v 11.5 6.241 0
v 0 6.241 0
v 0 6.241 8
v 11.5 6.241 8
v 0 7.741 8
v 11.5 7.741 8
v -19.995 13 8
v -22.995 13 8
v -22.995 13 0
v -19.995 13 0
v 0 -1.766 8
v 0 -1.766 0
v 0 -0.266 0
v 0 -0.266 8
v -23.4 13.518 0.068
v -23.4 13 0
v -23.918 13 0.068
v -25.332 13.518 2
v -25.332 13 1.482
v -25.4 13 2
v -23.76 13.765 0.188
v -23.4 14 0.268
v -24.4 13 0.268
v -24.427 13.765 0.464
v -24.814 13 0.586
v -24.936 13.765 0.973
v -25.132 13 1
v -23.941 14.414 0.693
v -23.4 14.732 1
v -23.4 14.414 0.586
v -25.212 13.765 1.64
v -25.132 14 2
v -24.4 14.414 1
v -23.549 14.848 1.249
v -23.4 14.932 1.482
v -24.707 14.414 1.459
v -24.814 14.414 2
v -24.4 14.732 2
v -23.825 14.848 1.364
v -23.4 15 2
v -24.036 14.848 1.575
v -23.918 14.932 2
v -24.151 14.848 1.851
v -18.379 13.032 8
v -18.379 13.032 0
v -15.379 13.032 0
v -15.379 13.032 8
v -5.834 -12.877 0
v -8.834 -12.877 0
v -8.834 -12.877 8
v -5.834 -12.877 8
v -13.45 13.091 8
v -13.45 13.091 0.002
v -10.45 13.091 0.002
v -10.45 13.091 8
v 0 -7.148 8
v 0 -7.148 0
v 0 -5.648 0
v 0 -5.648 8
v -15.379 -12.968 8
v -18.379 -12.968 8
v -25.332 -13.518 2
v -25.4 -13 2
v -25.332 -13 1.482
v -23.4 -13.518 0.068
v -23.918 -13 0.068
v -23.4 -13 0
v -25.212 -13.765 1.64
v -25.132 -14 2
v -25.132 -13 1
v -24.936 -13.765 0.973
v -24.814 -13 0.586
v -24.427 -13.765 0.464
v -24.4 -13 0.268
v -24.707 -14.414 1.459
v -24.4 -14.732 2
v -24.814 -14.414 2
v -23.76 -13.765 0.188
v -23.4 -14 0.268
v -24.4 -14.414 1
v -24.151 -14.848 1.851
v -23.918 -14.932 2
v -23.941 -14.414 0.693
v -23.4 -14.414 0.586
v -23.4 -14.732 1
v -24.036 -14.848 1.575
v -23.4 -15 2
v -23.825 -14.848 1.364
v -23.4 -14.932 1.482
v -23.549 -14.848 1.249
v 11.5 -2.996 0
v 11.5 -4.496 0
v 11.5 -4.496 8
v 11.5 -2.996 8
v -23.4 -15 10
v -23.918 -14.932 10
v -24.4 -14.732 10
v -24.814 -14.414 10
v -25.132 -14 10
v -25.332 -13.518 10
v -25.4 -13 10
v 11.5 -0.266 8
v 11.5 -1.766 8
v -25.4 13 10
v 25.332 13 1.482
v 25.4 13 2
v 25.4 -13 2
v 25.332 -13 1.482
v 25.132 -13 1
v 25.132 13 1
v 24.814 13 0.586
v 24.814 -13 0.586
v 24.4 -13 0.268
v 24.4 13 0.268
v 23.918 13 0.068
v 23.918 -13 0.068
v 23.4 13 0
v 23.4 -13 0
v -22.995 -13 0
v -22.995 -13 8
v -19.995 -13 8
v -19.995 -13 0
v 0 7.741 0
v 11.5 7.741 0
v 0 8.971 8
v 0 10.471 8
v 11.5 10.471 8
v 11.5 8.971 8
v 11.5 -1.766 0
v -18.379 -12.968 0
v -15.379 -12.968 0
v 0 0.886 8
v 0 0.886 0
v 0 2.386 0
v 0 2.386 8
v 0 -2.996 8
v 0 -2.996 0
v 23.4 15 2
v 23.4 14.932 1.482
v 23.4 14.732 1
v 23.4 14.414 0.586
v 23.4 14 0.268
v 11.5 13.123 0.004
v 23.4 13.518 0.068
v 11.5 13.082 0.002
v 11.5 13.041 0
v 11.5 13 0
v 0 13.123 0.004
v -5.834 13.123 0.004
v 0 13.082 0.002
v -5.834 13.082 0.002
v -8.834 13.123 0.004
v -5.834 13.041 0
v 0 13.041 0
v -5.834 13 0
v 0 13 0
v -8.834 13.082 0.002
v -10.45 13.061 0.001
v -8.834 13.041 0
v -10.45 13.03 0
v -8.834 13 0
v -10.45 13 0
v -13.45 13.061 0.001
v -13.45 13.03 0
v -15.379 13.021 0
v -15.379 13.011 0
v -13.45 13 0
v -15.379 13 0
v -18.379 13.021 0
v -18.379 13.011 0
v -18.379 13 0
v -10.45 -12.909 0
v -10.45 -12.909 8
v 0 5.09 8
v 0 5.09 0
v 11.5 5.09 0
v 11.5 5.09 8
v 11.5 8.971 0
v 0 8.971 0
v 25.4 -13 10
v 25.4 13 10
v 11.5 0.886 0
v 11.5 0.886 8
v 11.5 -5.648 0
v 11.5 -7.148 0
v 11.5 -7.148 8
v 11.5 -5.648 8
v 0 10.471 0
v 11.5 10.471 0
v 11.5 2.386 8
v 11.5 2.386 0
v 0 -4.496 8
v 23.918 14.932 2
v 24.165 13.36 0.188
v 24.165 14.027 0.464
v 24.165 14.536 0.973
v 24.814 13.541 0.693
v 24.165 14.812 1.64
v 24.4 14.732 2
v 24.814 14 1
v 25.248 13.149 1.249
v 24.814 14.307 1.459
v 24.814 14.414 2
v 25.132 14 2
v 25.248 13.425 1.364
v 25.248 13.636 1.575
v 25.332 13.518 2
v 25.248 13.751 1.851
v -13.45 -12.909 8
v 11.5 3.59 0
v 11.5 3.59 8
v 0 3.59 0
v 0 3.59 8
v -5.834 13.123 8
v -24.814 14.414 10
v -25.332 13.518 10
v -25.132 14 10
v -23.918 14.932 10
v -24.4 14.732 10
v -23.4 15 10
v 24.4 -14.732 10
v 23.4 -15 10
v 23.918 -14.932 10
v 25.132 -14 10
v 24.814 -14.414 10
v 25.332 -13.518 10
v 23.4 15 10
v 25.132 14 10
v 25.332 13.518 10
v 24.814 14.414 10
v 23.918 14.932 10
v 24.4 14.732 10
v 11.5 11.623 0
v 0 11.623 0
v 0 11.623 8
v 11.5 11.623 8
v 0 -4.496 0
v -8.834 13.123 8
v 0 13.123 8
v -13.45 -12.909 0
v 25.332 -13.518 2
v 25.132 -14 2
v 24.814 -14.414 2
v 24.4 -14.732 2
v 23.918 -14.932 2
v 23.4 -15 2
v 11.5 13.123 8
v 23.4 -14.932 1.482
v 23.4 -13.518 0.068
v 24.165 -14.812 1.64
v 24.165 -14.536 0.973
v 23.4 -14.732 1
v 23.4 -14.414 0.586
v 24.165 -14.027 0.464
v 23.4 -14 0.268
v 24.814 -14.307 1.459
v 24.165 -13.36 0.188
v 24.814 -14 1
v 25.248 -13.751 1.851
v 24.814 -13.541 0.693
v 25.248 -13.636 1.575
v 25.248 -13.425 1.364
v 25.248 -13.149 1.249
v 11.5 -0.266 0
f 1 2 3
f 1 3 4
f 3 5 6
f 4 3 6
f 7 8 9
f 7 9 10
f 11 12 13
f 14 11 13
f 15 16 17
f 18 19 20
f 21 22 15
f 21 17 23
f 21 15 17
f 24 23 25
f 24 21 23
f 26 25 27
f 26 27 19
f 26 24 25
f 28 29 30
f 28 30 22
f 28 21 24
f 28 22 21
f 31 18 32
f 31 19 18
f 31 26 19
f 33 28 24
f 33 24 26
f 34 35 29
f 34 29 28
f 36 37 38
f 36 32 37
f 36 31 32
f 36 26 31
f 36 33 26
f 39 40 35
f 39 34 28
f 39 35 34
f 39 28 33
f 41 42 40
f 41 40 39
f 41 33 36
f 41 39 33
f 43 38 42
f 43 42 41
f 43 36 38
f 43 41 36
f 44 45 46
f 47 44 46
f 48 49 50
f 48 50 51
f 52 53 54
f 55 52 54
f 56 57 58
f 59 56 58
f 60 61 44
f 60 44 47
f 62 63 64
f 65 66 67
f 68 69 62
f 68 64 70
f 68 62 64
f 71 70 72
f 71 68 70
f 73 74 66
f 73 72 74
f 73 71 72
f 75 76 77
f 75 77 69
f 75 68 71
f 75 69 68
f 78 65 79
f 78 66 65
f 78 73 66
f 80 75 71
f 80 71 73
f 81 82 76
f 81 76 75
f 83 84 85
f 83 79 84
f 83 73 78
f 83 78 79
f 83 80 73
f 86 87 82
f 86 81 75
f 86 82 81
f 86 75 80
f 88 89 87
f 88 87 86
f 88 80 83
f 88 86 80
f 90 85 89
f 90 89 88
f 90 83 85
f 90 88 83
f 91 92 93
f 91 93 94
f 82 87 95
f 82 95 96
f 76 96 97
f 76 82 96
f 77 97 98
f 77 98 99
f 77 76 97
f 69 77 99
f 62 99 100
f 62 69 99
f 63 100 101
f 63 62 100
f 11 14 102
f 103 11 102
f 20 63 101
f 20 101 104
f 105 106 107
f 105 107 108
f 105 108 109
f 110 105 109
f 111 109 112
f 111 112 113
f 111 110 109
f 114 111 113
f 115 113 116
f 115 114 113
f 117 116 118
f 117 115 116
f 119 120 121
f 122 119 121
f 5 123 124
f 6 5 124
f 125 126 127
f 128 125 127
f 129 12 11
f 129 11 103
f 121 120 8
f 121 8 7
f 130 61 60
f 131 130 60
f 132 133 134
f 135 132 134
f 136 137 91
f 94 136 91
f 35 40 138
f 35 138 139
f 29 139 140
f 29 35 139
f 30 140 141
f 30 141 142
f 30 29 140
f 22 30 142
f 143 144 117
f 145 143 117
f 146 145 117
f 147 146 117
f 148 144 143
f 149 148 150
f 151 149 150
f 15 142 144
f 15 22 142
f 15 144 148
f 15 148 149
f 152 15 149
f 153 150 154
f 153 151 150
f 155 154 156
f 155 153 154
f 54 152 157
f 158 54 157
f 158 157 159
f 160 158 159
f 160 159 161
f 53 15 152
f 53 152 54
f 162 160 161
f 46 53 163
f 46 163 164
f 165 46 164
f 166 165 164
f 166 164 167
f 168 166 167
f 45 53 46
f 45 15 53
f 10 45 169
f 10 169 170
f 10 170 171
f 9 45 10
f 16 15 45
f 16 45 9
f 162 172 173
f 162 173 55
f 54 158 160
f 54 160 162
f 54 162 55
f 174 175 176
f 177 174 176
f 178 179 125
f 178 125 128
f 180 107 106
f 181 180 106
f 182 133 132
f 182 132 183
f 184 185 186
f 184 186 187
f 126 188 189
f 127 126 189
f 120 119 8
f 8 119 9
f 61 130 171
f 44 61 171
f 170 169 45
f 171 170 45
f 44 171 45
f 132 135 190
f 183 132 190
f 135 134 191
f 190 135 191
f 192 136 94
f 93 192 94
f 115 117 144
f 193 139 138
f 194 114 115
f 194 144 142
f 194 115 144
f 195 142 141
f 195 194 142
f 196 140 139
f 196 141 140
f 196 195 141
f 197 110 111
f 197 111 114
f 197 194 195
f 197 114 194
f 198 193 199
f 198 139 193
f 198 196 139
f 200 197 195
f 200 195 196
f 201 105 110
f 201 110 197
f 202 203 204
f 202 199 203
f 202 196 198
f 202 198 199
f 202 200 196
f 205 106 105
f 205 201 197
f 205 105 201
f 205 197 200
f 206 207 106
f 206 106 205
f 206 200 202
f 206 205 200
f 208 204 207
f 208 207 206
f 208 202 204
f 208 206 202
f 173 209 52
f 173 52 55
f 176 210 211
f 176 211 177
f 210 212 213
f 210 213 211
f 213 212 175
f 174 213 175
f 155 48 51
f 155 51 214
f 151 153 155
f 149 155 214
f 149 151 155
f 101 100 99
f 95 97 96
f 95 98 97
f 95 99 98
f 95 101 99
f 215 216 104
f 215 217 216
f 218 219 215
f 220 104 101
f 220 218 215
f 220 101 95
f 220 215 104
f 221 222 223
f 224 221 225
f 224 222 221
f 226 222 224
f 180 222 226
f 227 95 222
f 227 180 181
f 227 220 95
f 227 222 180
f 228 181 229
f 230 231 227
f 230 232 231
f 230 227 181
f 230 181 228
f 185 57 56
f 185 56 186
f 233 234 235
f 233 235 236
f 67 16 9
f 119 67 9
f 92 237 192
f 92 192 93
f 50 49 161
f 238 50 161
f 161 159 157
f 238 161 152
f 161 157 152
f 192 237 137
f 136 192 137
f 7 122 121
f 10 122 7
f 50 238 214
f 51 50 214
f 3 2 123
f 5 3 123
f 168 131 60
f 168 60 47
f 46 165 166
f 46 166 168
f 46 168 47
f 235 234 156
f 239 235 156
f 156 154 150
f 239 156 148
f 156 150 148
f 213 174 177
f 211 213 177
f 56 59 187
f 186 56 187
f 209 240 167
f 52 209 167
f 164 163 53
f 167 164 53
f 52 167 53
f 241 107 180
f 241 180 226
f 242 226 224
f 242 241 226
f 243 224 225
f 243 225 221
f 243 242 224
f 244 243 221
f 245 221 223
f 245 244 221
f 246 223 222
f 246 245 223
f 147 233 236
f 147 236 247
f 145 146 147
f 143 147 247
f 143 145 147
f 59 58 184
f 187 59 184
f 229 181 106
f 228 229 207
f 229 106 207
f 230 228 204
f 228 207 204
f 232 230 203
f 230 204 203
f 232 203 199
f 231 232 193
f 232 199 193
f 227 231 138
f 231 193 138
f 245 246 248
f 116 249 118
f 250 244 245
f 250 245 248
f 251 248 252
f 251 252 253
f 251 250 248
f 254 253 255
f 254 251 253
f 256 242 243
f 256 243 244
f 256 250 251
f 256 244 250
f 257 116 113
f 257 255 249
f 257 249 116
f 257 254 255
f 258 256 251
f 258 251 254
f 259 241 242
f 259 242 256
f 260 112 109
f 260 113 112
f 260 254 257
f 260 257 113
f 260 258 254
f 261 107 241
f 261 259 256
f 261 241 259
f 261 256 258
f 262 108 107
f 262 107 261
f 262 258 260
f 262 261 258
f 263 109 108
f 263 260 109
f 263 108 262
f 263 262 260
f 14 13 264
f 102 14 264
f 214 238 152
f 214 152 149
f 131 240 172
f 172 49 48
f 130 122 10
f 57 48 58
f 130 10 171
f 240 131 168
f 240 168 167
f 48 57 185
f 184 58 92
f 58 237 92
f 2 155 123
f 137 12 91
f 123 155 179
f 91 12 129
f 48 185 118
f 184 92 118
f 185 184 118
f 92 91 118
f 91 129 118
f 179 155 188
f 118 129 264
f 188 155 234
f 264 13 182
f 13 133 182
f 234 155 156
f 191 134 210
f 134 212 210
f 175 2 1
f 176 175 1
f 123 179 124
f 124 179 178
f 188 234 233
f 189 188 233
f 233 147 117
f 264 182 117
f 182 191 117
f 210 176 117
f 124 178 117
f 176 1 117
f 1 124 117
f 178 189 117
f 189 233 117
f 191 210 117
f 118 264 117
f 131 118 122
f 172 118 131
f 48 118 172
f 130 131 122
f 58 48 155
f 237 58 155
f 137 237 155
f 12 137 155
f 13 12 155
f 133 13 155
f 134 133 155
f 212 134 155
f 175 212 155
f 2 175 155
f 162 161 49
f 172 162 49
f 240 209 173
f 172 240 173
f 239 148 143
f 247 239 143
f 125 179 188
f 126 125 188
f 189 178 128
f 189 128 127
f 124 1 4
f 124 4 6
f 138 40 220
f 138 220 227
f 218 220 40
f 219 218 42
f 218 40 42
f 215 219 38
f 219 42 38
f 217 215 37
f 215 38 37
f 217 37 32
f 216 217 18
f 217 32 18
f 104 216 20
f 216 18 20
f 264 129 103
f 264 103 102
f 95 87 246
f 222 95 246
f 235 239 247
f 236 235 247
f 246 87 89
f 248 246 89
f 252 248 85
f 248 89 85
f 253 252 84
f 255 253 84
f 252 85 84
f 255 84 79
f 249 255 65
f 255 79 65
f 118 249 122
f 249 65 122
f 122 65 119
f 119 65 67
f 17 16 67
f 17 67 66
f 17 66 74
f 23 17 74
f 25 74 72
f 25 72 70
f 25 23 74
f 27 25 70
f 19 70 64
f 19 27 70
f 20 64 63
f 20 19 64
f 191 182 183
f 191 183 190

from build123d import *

# Parameters (mm, degrees)
F0_W         = 50.8
F0_H         = 30
F1_DEPTH     = 10
F2_W         = 3
F2_H         = 26
F2_W_2       = 11.5
F2_H_2       = 1.5
F3_DEPTH     = 8
F4_T1_DEPTH  = 13
F4_T3_DEPTH  = 26
F4_T5_DEPTH  = 46.8
F4_S9_W      = 2
F4_S9_H      = 2
F4_T10_DEPTH = 2
F4_S15_W     = 2
F4_S15_H     = 2
F4_T16_DEPTH = 2
F4_S21_W     = 2
F4_S21_H     = 2
F4_T22_DEPTH = 2
F4_S27_W     = 2
F4_S27_H     = 2
F4_T28_DEPTH = 2


# Not quite as in the source:
# - a fillet or chamfer that OpenCascade refuses, or shapes differently, is made with other operations: its cross-section is extruded or revolved along the edge and cut away or added


with BuildPart() as f1:
    # F0 (on Top) → F1 (new body)
    with BuildSketch(Plane.XY):
        Rectangle(F0_W, F0_H)
    extrude(amount=F1_DEPTH)

    # F2 (on Top) → F3 (cut)
    with BuildSketch(Plane.XY):
        with Locations((-7.3340023962, 0.1232437862)):
            Rectangle(F2_W, F2_H)
        with Locations((-11.9503338486, 0.091059359)):
            Rectangle(F2_W, F2_H)
        with Locations((-16.8786235154, 0.0321844273)):
            Rectangle(F2_W, F2_H)
        with Locations((-21.4949549678, 0)):
            Rectangle(F2_W, F2_H)
        with Locations((5.75, 4.3395428155)):
            Rectangle(F2_W_2, F2_H_2)
        with Locations((5.75, 6.9914316775)):
            Rectangle(F2_W_2, F2_H_2)
        with Locations((5.75, 9.7213549241)):
            Rectangle(F2_W_2, F2_H_2)
        with Locations((5.75, 12.3732437862)):
            Rectangle(F2_W_2, F2_H_2)
        with Locations((5.75, 1.6359822841)):
            Rectangle(F2_W_2, F2_H_2)
        with Locations((5.75, -1.0159065779)):
            Rectangle(F2_W_2, F2_H_2)
        with Locations((5.75, -3.7458298245)):
            Rectangle(F2_W_2, F2_H_2)
        with Locations((5.75, -6.3977186866)):
            Rectangle(F2_W_2, F2_H_2)
    extrude(amount=F3_DEPTH, mode=Mode.SUBTRACT)

    # F4: fillet of radius 2 on 8 edges, made by hand

    # F4_s2 → F4_t1 (cut)
    with BuildSketch(Plane.XY.offset(2)):
        with BuildLine():
            ThreePointArc((25.4, 13), (24.8142135624, 14.4142135624), (23.4, 15))
            Line((23.4, 15), (25.4, 15))
            Line((25.4, 15), (25.4, 13))
        make_face()
        with BuildLine():
            ThreePointArc((25.4, -13), (24.8142135624, -14.4142135624), (23.4, -15))
            Line((23.4, -15), (25.4, -15))
            Line((25.4, -15), (25.4, -13))
        make_face()
        with BuildLine():
            ThreePointArc((-23.4, -15), (-24.8142135624, -14.4142135624), (-25.4, -13))
            Line((-25.4, -13), (-25.4, -15))
            Line((-25.4, -15), (-23.4, -15))
        make_face()
        with BuildLine():
            ThreePointArc((-23.4, 15), (-24.8142135624, 14.4142135624), (-25.4, 13))
            Line((-25.4, 13), (-25.4, 15))
            Line((-25.4, 15), (-23.4, 15))
        make_face()
    extrude(amount=F4_T1_DEPTH, mode=Mode.SUBTRACT)

    # F4_s4 → F4_t3 (cut)
    with BuildSketch(Plane.XZ.offset(-13)):
        with BuildLine():
            ThreePointArc((25.4, 2), (24.8142135624, 0.5857864376), (23.4, 0))
            Line((23.4, 0), (25.4, 0))
            Line((25.4, 0), (25.4, 2))
        make_face()
        with BuildLine():
            ThreePointArc((-23.4, 0), (-24.8142135624, 0.5857864376), (-25.4, 2))
            Line((-25.4, 2), (-25.4, 0))
            Line((-25.4, 0), (-23.4, 0))
        make_face()
    extrude(amount=F4_T3_DEPTH, mode=Mode.SUBTRACT)

    # F4_s6 → F4_t5 (cut)
    with BuildSketch(Plane.YZ.offset(-23.4)):
        with BuildLine():
            ThreePointArc((-15, 2), (-14.4142135624, 0.5857864376), (-13, 0))
            Line((-13, 0), (-15, 0))
            Line((-15, 0), (-15, 2))
        make_face()
        with BuildLine():
            ThreePointArc((15, 2), (14.4142135624, 0.5857864376), (13, 0))
            Line((13, 0), (15, 0))
            Line((15, 0), (15, 2))
        make_face()
    extrude(amount=F4_T5_DEPTH, mode=Mode.SUBTRACT)


with BuildPart() as f4_tool8:
    # F4_s9 → F4_t10 (new body)
    with BuildSketch(Plane.YZ.offset(23.4)):
        with Locations((14, 1)):
            Rectangle(F4_S9_W, F4_S9_H)
    extrude(amount=F4_T10_DEPTH)

    # F4_s11 → F4_t12 (revolve, cut)
    with BuildSketch(Plane(origin=(23.4, 13, 2), x_dir=(0, -0.7071067812, 0.7071067812), z_dir=(0, 0.7071067812, 0.7071067812))):
        with BuildLine():
            ThreePointArc((0, -2), (2, 0), (0, 2))
            Line((0, 2), (0, -2))
        make_face()
    revolve(axis=Axis((23.4, 13, 2), (1, 0, 0)), mode=Mode.SUBTRACT)


with BuildPart() as f1_1:
    add(f1.part)

    # F4_t7: cut F4_tool8
    add(f4_tool8.part, mode=Mode.SUBTRACT)


with BuildPart() as f4_tool14:
    # F4_s15 → F4_t16 (new body)
    with BuildSketch(Plane.YZ.offset(23.4)):
        with Locations((-14, 1)):
            Rectangle(F4_S15_W, F4_S15_H)
    extrude(amount=F4_T16_DEPTH)

    # F4_s17 → F4_t18 (revolve, cut)
    with BuildSketch(Plane(origin=(23.4, -13, 2), x_dir=(0, 0.7071067812, 0.7071067812), z_dir=(0, 0.7071067812, -0.7071067812))):
        with BuildLine():
            ThreePointArc((0, -2), (2, 0), (0, 2))
            Line((0, 2), (0, -2))
        make_face()
    revolve(axis=Axis((23.4, -13, 2), (1, 0, 0)), mode=Mode.SUBTRACT)


with BuildPart() as f1_2:
    add(f1_1.part)

    # F4_t13: cut F4_tool14
    add(f4_tool14.part, mode=Mode.SUBTRACT)


with BuildPart() as f4_tool20:
    # F4_s21 → F4_t22 (new body)
    with BuildSketch(Plane.XZ.offset(13)):
        with Locations((-24.4, 1)):
            Rectangle(F4_S21_W, F4_S21_H)
    extrude(amount=F4_T22_DEPTH)

    # F4_s23 → F4_t24 (revolve, cut)
    with BuildSketch(Plane(origin=(-23.4, -13, 2), x_dir=(0.7071067812, 0, 0.7071067812), z_dir=(0.7071067812, 0, -0.7071067812))):
        with BuildLine():
            ThreePointArc((0, -2), (2, 0), (0, 2))
            Line((0, 2), (0, -2))
        make_face()
    revolve(axis=Axis((-23.4, -13, 2), (0, -1, 0)), mode=Mode.SUBTRACT)


with BuildPart() as f1_3:
    add(f1_2.part)

    # F4_t19: cut F4_tool20
    add(f4_tool20.part, mode=Mode.SUBTRACT)


with BuildPart() as f4_tool26:
    # F4_s27 → F4_t28 (new body)
    with BuildSketch(Plane.XZ.offset(-13)):
        with Locations((-24.4, 1)):
            Rectangle(F4_S27_W, F4_S27_H)
    extrude(amount=-F4_T28_DEPTH)

    # F4_s29 → F4_t30 (revolve, cut)
    with BuildSketch(Plane(origin=(-23.4, 13, 2), x_dir=(0.7071067812, 0, 0.7071067812), z_dir=(-0.7071067812, 0, 0.7071067812))):
        with BuildLine():
            ThreePointArc((0, -2), (2, 0), (0, 2))
            Line((0, 2), (0, -2))
        make_face()
    revolve(axis=Axis((-23.4, 13, 2), (0, 1, 0)), mode=Mode.SUBTRACT)


with BuildPart() as f1_4:
    add(f1_3.part)

    # F4_t25: cut F4_tool26
    add(f4_tool26.part, mode=Mode.SUBTRACT)


solid = f1_4.part
